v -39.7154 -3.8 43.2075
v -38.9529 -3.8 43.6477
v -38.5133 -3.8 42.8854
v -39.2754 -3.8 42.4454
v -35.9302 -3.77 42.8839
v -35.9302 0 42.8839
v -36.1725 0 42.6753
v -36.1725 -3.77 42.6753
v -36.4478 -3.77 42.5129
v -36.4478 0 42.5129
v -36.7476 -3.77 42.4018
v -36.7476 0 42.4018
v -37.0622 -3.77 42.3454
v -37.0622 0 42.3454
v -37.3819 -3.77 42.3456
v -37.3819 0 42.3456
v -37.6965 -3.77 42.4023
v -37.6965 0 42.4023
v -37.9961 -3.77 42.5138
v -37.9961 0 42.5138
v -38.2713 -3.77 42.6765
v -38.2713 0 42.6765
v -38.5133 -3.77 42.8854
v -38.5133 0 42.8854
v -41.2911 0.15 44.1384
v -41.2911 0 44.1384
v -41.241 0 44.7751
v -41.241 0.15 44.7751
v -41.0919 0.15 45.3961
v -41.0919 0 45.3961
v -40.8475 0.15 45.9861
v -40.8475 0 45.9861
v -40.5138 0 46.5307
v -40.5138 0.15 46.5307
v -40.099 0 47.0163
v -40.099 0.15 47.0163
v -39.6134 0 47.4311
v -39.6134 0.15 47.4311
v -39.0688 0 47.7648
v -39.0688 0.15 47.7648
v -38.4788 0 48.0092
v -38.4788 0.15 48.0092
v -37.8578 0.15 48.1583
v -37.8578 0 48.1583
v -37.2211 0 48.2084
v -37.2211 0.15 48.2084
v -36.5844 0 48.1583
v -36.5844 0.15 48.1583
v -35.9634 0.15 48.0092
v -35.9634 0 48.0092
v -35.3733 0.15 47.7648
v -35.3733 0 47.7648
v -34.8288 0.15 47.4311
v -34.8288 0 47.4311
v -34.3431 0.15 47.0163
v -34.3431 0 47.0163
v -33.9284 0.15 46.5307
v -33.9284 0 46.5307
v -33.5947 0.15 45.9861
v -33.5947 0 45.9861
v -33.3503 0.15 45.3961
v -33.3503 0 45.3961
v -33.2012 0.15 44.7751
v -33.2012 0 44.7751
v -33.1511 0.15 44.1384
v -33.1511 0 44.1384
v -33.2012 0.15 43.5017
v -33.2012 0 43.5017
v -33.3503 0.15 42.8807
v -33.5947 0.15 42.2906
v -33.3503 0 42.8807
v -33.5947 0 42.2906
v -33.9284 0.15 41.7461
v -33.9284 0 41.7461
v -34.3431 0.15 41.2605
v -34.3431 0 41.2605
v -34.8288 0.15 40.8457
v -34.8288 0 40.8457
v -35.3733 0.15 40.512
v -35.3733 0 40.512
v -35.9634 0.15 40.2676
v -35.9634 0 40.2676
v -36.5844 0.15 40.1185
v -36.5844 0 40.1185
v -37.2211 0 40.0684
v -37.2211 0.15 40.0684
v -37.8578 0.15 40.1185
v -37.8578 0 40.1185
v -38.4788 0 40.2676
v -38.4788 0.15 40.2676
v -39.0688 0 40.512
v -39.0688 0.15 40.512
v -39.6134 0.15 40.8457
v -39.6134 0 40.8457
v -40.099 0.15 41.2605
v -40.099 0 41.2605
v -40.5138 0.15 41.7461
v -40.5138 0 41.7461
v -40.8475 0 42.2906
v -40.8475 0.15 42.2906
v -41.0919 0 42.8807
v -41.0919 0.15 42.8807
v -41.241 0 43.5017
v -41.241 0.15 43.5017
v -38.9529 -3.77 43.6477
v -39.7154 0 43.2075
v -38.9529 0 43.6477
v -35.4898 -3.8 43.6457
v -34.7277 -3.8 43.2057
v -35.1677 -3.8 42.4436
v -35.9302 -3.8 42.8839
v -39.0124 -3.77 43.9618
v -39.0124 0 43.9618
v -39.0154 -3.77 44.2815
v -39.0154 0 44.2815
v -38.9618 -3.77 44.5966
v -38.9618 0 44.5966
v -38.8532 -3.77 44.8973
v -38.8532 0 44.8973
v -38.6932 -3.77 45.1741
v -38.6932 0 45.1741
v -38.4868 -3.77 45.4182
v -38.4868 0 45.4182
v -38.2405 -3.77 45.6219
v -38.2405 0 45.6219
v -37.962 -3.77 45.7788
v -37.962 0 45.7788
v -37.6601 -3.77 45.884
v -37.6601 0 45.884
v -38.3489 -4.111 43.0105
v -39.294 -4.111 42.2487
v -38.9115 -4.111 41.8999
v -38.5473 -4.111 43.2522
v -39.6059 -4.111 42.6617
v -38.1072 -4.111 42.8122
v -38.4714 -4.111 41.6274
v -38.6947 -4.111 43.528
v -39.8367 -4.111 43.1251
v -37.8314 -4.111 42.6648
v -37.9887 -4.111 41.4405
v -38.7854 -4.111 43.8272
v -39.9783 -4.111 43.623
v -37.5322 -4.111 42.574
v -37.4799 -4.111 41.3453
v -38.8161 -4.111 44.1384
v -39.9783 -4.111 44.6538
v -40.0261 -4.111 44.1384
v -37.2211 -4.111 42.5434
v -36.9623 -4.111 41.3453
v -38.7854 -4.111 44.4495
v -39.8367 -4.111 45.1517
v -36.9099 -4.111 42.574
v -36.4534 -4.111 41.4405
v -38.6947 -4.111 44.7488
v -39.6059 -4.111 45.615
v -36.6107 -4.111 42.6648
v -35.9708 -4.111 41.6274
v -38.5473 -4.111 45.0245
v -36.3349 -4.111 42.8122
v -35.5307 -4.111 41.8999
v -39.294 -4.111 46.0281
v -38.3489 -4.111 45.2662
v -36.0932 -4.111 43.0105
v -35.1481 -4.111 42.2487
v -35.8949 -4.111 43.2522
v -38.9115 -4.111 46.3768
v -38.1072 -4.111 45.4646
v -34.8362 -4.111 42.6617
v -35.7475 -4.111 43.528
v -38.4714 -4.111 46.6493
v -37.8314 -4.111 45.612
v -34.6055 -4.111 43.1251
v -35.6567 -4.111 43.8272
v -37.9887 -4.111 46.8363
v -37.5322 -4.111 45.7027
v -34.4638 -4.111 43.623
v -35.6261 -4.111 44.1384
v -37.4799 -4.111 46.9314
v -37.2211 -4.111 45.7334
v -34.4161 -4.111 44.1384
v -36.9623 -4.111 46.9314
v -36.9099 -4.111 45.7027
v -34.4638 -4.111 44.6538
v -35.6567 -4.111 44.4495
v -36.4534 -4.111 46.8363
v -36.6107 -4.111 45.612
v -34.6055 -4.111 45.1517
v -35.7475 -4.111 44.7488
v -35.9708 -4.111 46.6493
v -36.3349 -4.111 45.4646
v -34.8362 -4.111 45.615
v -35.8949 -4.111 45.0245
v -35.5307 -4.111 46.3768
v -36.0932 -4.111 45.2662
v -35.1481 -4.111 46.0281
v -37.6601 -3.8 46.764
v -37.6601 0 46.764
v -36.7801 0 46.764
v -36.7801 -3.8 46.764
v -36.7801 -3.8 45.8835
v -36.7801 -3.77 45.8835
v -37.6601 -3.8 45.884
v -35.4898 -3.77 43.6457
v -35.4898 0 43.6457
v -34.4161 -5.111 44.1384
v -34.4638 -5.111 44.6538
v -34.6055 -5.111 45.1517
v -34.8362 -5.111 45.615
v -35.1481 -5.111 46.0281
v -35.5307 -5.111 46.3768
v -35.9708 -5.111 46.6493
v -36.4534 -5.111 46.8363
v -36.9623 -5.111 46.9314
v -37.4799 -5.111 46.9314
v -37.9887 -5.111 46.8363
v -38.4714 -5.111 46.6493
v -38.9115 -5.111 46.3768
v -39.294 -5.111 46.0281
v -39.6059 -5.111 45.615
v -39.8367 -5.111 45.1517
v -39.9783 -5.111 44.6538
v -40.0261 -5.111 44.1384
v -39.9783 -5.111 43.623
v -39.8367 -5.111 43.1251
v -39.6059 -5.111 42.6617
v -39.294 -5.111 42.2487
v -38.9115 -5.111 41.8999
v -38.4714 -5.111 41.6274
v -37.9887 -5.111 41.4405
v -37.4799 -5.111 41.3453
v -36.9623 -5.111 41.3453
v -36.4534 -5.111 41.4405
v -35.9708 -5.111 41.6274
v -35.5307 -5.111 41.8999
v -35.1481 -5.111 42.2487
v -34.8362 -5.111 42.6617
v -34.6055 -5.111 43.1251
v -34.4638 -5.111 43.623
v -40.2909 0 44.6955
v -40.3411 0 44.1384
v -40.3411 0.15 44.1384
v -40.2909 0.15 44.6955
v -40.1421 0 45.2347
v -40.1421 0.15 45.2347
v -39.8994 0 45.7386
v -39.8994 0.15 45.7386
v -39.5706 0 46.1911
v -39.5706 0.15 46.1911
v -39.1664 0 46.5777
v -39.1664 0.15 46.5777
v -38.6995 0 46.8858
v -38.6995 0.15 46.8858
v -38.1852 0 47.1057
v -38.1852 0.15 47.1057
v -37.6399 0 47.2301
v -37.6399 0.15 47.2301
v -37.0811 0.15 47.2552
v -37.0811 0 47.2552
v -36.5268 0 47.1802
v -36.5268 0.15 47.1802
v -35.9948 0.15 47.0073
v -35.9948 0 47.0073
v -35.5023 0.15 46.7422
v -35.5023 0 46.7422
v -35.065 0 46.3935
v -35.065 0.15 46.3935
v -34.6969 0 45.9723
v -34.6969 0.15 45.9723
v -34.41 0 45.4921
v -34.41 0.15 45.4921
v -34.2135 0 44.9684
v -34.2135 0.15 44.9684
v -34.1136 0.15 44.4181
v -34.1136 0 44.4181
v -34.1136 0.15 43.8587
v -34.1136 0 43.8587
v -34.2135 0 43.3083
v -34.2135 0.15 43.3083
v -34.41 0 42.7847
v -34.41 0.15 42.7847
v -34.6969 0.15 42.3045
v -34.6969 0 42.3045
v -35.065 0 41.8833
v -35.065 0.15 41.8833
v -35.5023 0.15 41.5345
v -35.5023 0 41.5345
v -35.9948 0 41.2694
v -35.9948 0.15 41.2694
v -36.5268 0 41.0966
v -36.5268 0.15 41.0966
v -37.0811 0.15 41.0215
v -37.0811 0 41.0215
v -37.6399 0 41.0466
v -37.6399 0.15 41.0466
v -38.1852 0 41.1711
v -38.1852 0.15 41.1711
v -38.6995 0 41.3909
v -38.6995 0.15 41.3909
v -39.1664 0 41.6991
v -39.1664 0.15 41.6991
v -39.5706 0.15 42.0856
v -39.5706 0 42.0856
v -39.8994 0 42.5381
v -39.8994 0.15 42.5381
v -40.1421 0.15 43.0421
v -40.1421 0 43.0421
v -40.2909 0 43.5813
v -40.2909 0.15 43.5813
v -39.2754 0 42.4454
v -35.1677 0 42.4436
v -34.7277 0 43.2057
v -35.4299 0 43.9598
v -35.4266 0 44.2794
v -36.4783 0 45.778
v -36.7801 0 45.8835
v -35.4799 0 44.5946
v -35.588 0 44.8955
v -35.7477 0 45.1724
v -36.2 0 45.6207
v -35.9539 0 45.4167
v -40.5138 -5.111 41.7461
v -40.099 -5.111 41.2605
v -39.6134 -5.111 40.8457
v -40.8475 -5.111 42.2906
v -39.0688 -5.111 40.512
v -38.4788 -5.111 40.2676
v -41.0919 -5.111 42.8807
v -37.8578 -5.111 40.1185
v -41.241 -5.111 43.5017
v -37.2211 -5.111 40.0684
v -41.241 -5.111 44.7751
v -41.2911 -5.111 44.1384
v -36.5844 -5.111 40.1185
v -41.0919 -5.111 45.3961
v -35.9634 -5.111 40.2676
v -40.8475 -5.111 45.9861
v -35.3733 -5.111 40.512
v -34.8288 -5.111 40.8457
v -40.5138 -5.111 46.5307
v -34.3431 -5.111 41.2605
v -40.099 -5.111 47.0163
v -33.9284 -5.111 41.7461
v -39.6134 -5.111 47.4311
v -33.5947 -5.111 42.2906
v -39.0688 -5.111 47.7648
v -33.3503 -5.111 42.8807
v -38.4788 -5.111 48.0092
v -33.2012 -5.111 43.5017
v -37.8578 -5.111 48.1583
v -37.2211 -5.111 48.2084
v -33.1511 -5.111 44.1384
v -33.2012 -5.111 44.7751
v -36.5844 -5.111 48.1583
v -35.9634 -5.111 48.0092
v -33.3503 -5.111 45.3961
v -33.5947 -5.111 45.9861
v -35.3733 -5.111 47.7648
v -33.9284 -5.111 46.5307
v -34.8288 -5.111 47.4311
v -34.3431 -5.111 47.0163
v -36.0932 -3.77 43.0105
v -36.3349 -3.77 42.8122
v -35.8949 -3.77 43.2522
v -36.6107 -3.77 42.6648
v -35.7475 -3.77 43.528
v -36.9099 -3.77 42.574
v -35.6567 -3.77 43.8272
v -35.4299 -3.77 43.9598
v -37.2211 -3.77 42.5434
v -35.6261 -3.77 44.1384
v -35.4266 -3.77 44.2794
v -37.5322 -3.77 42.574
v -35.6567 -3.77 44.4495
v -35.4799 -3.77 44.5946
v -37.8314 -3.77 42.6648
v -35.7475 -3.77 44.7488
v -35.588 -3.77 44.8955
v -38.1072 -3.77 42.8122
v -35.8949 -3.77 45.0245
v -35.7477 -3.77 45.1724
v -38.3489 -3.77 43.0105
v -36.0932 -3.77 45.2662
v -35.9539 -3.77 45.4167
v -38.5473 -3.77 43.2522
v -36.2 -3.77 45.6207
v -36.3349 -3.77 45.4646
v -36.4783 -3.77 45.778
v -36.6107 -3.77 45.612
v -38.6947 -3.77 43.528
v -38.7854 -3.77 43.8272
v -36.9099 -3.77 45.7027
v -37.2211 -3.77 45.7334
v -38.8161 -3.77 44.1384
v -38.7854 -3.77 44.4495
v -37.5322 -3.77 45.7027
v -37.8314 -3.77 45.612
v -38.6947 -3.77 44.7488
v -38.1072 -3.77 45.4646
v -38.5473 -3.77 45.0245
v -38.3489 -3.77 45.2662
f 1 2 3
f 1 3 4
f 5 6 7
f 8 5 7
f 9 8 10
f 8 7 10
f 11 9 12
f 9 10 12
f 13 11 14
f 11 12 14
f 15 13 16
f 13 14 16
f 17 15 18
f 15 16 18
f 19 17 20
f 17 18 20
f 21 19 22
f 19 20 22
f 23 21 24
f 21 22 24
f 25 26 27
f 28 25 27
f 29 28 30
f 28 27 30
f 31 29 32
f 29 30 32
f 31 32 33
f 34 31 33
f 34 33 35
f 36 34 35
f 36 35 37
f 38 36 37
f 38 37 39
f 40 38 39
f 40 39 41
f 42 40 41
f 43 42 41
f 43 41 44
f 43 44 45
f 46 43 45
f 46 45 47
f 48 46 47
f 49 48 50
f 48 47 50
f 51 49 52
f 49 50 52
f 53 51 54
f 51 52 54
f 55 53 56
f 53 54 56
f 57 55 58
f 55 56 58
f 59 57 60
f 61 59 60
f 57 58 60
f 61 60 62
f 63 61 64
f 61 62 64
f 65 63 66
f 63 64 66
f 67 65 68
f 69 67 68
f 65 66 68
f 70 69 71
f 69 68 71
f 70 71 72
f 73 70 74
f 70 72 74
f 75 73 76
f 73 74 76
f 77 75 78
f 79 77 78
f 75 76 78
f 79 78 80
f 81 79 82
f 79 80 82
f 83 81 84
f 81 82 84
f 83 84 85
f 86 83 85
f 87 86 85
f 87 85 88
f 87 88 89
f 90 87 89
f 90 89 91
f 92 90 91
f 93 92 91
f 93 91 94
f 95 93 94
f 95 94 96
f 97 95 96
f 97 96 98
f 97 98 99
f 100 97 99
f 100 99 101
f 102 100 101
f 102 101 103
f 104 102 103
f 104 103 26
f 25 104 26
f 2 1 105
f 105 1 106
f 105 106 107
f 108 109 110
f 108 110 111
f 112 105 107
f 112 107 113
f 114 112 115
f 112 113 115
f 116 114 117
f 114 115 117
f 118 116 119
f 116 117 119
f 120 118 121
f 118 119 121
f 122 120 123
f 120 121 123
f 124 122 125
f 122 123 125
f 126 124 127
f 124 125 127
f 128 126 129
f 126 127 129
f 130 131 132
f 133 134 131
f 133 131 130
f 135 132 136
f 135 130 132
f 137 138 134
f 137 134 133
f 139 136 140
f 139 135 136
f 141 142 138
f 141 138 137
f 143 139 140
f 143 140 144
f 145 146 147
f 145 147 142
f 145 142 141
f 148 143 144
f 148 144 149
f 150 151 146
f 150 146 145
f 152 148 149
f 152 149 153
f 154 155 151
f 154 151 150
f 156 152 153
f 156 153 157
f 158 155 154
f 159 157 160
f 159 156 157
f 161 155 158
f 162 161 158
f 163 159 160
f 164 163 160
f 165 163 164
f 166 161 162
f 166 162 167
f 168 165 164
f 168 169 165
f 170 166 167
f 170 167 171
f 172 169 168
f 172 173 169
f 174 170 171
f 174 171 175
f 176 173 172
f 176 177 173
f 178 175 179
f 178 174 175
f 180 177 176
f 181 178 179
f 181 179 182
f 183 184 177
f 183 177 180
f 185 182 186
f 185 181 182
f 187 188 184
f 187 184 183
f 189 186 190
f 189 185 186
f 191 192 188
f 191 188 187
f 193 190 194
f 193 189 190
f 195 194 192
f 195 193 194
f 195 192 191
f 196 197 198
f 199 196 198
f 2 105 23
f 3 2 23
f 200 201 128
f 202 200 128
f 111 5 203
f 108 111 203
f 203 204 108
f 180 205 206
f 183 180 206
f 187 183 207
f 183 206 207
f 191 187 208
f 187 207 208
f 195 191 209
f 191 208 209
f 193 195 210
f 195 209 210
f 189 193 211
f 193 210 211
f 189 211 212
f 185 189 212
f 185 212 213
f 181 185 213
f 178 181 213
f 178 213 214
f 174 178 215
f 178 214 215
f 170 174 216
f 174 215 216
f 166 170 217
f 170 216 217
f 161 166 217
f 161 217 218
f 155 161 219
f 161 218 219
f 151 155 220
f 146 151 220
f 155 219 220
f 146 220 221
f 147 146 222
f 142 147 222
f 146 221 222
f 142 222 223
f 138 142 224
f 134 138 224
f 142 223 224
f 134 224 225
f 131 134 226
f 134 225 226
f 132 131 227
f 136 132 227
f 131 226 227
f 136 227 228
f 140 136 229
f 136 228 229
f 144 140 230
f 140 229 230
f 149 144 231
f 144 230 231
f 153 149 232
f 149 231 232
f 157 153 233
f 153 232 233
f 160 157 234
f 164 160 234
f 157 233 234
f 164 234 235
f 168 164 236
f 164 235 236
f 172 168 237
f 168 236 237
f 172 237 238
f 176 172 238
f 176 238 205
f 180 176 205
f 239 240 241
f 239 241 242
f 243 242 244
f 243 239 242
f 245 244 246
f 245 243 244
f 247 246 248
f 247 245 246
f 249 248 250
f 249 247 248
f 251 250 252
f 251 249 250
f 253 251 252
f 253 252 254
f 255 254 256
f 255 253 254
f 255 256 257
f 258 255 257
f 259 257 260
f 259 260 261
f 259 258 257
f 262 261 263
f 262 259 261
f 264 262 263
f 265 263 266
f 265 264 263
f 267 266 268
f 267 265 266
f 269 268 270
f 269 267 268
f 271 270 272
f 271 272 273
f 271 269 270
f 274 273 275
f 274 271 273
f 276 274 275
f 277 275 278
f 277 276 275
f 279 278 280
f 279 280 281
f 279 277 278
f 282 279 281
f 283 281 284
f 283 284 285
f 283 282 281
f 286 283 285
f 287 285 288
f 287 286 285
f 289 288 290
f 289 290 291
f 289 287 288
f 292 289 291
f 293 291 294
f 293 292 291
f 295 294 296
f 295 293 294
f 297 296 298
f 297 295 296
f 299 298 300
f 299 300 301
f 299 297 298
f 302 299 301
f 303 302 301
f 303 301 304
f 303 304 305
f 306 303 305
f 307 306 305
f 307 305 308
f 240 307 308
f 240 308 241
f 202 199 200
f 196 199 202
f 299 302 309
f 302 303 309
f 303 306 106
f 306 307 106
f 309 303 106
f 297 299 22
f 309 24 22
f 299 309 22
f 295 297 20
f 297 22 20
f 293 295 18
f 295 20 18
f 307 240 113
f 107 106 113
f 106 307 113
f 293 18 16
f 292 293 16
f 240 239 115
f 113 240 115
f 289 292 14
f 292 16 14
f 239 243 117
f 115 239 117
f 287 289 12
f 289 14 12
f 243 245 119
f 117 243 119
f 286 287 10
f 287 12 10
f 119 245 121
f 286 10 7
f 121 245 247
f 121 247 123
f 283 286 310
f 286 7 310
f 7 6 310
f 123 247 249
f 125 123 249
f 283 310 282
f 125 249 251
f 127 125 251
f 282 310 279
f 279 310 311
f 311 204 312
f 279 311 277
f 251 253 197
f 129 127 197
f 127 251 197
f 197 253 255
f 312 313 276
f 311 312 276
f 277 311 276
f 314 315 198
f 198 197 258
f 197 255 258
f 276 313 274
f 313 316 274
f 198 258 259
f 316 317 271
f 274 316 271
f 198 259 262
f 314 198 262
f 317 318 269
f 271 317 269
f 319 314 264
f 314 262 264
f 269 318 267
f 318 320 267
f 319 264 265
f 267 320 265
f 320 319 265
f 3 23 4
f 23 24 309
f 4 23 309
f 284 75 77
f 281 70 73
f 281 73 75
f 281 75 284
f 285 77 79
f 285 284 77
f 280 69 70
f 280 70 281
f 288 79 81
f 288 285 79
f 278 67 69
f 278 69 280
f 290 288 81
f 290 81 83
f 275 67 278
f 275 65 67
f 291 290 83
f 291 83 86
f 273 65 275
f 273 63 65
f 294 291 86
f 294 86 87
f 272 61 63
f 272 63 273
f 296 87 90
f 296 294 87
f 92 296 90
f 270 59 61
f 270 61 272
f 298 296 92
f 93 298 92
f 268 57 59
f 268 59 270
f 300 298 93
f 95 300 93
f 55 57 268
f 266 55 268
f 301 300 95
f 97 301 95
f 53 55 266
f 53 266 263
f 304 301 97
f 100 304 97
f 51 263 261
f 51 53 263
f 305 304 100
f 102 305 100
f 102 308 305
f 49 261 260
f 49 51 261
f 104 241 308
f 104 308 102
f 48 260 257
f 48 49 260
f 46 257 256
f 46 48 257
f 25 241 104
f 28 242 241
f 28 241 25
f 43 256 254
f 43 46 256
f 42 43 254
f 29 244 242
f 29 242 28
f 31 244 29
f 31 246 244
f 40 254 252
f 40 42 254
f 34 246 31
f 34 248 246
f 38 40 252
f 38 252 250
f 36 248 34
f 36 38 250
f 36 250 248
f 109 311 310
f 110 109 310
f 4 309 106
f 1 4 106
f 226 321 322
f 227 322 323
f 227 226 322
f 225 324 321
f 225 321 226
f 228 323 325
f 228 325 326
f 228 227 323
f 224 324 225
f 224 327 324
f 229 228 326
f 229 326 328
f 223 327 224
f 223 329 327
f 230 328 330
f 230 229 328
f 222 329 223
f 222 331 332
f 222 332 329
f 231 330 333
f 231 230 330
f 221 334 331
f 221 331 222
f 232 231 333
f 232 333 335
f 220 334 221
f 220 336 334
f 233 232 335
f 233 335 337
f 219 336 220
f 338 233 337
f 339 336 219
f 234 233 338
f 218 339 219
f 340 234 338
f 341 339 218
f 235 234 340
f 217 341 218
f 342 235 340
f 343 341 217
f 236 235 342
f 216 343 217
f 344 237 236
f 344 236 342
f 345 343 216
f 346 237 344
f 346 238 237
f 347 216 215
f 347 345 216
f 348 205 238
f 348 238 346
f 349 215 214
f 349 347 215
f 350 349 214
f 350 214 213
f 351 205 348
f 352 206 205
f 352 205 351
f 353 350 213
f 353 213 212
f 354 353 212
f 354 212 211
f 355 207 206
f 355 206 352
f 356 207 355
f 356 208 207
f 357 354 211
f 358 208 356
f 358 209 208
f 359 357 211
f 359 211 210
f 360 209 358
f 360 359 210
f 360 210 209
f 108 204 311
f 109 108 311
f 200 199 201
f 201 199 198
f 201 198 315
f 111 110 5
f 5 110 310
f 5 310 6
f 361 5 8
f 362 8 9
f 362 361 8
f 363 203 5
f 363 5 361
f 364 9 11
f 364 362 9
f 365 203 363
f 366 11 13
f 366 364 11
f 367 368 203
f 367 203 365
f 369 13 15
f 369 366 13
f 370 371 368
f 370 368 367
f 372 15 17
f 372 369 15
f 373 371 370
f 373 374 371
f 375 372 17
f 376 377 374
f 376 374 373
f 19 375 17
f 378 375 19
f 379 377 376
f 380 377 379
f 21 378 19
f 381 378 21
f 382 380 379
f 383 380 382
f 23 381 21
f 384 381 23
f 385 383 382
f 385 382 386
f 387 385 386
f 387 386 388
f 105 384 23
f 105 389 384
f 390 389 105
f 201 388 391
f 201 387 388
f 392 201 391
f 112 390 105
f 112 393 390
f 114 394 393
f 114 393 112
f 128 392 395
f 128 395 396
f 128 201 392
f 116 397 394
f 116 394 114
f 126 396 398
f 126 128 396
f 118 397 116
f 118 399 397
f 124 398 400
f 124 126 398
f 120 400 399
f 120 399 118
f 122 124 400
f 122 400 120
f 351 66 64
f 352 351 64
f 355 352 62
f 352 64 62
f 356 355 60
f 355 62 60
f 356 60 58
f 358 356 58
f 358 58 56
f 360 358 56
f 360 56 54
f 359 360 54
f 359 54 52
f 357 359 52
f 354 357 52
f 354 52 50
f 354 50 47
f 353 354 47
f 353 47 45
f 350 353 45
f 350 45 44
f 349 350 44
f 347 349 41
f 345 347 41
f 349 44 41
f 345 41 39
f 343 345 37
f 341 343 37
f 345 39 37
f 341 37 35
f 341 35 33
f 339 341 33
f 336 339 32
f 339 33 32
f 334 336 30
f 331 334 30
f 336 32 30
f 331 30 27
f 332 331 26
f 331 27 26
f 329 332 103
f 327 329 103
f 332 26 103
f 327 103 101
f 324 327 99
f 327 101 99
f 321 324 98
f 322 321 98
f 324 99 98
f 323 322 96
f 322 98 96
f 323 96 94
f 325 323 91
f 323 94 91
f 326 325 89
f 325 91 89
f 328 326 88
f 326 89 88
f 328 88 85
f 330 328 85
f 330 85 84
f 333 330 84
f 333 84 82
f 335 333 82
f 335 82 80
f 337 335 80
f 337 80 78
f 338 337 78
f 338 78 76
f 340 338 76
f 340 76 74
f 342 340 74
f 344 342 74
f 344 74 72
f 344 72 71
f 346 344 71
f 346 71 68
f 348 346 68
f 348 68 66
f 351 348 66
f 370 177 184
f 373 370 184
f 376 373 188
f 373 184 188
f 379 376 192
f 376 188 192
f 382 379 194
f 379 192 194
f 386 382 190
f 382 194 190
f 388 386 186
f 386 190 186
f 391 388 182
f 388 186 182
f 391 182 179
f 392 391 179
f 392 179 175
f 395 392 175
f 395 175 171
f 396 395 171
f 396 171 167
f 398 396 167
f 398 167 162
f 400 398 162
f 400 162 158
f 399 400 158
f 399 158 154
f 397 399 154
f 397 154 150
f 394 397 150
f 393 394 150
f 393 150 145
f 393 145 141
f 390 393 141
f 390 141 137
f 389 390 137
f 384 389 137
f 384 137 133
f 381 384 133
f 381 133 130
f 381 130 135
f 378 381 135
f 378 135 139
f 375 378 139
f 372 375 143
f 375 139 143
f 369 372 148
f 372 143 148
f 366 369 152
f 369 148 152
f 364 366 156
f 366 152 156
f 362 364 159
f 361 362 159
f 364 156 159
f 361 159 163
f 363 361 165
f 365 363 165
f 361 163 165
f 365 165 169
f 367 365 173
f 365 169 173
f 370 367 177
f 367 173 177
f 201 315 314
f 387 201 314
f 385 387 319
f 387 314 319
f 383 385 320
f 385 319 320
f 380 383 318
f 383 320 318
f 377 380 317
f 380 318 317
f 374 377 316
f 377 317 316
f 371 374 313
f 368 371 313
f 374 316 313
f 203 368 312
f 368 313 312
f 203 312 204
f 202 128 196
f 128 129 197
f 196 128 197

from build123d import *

# Parameters (mm, degrees)
F0_R      = 4.07
F1_DEPTH  = 5.111
F2_R      = 2.805
F3_DEPTH  = 1
F4_R      = 1.8
F5_DEPTH  = 3.77
F6_R      = 1.595
F7_DEPTH  = 4.112
F9_DEPTH  = 3.8
F10_R     = 4.07
F10_R_2   = 3.12
F11_DEPTH = 0.15


with BuildPart() as f1:
    # F0 (on Front) → F1 (new body)
    with BuildSketch(Plane.XZ):
        with Locations((-37.221067, 44.138376)):
            Circle(F0_R)
    extrude(amount=F1_DEPTH)

    # F2 (on face) → F3 (cut)
    with BuildSketch(Plane.XZ.offset(5.111)):
        with Locations((-37.221067, 44.138376)):
            Circle(F2_R)
    extrude(amount=-F3_DEPTH, mode=Mode.SUBTRACT)

    # F4 (on face) → F5 (cut)
    with BuildSketch(Plane(origin=(0, 0, 0), x_dir=(-1, 0, 0), z_dir=(0, 1, 0))):
        with Locations((37.221067, 44.138376)):
            Circle(F4_R)
    extrude(amount=-F5_DEPTH, mode=Mode.SUBTRACT)

    # F6 (on face) → F7 (cut, through all)
    with BuildSketch(Plane.XZ.offset(4.111)):
        with Locations((-37.221067, 44.138376)):
            Circle(F6_R)
    extrude(amount=-F7_DEPTH, mode=Mode.SUBTRACT)

    # F8 (on face) → F9 (cut)
    with BuildSketch(Plane(origin=(0, 0, 0), x_dir=(-1, 0, 0), z_dir=(0, 1, 0))):
        Polygon((36.780077, 46.764019), (36.780077, 45.88352), (37.660077, 45.884019), (37.660077, 46.764019), align=None)
        Polygon((34.727688, 43.205748), (35.167688, 42.443646), (35.930222, 42.883896), (35.48979, 43.645748), align=None)
        Polygon((39.275435, 42.44536), (39.715435, 43.207462), (38.952901, 43.647712), (38.513333, 42.88536), align=None)
    extrude(amount=-F9_DEPTH, mode=Mode.SUBTRACT)

    # F10 (on face) → F11 (join)
    with BuildSketch(Plane(origin=(0, 0, 0), x_dir=(-1, 0, 0), z_dir=(0, 1, 0))):
        with Locations((37.221067, 44.138376)):
            Circle(F10_R)
        with Locations((37.221067, 44.138376)):
            Circle(F10_R_2, mode=Mode.SUBTRACT)
    extrude(amount=F11_DEPTH)


solid = f1.part
